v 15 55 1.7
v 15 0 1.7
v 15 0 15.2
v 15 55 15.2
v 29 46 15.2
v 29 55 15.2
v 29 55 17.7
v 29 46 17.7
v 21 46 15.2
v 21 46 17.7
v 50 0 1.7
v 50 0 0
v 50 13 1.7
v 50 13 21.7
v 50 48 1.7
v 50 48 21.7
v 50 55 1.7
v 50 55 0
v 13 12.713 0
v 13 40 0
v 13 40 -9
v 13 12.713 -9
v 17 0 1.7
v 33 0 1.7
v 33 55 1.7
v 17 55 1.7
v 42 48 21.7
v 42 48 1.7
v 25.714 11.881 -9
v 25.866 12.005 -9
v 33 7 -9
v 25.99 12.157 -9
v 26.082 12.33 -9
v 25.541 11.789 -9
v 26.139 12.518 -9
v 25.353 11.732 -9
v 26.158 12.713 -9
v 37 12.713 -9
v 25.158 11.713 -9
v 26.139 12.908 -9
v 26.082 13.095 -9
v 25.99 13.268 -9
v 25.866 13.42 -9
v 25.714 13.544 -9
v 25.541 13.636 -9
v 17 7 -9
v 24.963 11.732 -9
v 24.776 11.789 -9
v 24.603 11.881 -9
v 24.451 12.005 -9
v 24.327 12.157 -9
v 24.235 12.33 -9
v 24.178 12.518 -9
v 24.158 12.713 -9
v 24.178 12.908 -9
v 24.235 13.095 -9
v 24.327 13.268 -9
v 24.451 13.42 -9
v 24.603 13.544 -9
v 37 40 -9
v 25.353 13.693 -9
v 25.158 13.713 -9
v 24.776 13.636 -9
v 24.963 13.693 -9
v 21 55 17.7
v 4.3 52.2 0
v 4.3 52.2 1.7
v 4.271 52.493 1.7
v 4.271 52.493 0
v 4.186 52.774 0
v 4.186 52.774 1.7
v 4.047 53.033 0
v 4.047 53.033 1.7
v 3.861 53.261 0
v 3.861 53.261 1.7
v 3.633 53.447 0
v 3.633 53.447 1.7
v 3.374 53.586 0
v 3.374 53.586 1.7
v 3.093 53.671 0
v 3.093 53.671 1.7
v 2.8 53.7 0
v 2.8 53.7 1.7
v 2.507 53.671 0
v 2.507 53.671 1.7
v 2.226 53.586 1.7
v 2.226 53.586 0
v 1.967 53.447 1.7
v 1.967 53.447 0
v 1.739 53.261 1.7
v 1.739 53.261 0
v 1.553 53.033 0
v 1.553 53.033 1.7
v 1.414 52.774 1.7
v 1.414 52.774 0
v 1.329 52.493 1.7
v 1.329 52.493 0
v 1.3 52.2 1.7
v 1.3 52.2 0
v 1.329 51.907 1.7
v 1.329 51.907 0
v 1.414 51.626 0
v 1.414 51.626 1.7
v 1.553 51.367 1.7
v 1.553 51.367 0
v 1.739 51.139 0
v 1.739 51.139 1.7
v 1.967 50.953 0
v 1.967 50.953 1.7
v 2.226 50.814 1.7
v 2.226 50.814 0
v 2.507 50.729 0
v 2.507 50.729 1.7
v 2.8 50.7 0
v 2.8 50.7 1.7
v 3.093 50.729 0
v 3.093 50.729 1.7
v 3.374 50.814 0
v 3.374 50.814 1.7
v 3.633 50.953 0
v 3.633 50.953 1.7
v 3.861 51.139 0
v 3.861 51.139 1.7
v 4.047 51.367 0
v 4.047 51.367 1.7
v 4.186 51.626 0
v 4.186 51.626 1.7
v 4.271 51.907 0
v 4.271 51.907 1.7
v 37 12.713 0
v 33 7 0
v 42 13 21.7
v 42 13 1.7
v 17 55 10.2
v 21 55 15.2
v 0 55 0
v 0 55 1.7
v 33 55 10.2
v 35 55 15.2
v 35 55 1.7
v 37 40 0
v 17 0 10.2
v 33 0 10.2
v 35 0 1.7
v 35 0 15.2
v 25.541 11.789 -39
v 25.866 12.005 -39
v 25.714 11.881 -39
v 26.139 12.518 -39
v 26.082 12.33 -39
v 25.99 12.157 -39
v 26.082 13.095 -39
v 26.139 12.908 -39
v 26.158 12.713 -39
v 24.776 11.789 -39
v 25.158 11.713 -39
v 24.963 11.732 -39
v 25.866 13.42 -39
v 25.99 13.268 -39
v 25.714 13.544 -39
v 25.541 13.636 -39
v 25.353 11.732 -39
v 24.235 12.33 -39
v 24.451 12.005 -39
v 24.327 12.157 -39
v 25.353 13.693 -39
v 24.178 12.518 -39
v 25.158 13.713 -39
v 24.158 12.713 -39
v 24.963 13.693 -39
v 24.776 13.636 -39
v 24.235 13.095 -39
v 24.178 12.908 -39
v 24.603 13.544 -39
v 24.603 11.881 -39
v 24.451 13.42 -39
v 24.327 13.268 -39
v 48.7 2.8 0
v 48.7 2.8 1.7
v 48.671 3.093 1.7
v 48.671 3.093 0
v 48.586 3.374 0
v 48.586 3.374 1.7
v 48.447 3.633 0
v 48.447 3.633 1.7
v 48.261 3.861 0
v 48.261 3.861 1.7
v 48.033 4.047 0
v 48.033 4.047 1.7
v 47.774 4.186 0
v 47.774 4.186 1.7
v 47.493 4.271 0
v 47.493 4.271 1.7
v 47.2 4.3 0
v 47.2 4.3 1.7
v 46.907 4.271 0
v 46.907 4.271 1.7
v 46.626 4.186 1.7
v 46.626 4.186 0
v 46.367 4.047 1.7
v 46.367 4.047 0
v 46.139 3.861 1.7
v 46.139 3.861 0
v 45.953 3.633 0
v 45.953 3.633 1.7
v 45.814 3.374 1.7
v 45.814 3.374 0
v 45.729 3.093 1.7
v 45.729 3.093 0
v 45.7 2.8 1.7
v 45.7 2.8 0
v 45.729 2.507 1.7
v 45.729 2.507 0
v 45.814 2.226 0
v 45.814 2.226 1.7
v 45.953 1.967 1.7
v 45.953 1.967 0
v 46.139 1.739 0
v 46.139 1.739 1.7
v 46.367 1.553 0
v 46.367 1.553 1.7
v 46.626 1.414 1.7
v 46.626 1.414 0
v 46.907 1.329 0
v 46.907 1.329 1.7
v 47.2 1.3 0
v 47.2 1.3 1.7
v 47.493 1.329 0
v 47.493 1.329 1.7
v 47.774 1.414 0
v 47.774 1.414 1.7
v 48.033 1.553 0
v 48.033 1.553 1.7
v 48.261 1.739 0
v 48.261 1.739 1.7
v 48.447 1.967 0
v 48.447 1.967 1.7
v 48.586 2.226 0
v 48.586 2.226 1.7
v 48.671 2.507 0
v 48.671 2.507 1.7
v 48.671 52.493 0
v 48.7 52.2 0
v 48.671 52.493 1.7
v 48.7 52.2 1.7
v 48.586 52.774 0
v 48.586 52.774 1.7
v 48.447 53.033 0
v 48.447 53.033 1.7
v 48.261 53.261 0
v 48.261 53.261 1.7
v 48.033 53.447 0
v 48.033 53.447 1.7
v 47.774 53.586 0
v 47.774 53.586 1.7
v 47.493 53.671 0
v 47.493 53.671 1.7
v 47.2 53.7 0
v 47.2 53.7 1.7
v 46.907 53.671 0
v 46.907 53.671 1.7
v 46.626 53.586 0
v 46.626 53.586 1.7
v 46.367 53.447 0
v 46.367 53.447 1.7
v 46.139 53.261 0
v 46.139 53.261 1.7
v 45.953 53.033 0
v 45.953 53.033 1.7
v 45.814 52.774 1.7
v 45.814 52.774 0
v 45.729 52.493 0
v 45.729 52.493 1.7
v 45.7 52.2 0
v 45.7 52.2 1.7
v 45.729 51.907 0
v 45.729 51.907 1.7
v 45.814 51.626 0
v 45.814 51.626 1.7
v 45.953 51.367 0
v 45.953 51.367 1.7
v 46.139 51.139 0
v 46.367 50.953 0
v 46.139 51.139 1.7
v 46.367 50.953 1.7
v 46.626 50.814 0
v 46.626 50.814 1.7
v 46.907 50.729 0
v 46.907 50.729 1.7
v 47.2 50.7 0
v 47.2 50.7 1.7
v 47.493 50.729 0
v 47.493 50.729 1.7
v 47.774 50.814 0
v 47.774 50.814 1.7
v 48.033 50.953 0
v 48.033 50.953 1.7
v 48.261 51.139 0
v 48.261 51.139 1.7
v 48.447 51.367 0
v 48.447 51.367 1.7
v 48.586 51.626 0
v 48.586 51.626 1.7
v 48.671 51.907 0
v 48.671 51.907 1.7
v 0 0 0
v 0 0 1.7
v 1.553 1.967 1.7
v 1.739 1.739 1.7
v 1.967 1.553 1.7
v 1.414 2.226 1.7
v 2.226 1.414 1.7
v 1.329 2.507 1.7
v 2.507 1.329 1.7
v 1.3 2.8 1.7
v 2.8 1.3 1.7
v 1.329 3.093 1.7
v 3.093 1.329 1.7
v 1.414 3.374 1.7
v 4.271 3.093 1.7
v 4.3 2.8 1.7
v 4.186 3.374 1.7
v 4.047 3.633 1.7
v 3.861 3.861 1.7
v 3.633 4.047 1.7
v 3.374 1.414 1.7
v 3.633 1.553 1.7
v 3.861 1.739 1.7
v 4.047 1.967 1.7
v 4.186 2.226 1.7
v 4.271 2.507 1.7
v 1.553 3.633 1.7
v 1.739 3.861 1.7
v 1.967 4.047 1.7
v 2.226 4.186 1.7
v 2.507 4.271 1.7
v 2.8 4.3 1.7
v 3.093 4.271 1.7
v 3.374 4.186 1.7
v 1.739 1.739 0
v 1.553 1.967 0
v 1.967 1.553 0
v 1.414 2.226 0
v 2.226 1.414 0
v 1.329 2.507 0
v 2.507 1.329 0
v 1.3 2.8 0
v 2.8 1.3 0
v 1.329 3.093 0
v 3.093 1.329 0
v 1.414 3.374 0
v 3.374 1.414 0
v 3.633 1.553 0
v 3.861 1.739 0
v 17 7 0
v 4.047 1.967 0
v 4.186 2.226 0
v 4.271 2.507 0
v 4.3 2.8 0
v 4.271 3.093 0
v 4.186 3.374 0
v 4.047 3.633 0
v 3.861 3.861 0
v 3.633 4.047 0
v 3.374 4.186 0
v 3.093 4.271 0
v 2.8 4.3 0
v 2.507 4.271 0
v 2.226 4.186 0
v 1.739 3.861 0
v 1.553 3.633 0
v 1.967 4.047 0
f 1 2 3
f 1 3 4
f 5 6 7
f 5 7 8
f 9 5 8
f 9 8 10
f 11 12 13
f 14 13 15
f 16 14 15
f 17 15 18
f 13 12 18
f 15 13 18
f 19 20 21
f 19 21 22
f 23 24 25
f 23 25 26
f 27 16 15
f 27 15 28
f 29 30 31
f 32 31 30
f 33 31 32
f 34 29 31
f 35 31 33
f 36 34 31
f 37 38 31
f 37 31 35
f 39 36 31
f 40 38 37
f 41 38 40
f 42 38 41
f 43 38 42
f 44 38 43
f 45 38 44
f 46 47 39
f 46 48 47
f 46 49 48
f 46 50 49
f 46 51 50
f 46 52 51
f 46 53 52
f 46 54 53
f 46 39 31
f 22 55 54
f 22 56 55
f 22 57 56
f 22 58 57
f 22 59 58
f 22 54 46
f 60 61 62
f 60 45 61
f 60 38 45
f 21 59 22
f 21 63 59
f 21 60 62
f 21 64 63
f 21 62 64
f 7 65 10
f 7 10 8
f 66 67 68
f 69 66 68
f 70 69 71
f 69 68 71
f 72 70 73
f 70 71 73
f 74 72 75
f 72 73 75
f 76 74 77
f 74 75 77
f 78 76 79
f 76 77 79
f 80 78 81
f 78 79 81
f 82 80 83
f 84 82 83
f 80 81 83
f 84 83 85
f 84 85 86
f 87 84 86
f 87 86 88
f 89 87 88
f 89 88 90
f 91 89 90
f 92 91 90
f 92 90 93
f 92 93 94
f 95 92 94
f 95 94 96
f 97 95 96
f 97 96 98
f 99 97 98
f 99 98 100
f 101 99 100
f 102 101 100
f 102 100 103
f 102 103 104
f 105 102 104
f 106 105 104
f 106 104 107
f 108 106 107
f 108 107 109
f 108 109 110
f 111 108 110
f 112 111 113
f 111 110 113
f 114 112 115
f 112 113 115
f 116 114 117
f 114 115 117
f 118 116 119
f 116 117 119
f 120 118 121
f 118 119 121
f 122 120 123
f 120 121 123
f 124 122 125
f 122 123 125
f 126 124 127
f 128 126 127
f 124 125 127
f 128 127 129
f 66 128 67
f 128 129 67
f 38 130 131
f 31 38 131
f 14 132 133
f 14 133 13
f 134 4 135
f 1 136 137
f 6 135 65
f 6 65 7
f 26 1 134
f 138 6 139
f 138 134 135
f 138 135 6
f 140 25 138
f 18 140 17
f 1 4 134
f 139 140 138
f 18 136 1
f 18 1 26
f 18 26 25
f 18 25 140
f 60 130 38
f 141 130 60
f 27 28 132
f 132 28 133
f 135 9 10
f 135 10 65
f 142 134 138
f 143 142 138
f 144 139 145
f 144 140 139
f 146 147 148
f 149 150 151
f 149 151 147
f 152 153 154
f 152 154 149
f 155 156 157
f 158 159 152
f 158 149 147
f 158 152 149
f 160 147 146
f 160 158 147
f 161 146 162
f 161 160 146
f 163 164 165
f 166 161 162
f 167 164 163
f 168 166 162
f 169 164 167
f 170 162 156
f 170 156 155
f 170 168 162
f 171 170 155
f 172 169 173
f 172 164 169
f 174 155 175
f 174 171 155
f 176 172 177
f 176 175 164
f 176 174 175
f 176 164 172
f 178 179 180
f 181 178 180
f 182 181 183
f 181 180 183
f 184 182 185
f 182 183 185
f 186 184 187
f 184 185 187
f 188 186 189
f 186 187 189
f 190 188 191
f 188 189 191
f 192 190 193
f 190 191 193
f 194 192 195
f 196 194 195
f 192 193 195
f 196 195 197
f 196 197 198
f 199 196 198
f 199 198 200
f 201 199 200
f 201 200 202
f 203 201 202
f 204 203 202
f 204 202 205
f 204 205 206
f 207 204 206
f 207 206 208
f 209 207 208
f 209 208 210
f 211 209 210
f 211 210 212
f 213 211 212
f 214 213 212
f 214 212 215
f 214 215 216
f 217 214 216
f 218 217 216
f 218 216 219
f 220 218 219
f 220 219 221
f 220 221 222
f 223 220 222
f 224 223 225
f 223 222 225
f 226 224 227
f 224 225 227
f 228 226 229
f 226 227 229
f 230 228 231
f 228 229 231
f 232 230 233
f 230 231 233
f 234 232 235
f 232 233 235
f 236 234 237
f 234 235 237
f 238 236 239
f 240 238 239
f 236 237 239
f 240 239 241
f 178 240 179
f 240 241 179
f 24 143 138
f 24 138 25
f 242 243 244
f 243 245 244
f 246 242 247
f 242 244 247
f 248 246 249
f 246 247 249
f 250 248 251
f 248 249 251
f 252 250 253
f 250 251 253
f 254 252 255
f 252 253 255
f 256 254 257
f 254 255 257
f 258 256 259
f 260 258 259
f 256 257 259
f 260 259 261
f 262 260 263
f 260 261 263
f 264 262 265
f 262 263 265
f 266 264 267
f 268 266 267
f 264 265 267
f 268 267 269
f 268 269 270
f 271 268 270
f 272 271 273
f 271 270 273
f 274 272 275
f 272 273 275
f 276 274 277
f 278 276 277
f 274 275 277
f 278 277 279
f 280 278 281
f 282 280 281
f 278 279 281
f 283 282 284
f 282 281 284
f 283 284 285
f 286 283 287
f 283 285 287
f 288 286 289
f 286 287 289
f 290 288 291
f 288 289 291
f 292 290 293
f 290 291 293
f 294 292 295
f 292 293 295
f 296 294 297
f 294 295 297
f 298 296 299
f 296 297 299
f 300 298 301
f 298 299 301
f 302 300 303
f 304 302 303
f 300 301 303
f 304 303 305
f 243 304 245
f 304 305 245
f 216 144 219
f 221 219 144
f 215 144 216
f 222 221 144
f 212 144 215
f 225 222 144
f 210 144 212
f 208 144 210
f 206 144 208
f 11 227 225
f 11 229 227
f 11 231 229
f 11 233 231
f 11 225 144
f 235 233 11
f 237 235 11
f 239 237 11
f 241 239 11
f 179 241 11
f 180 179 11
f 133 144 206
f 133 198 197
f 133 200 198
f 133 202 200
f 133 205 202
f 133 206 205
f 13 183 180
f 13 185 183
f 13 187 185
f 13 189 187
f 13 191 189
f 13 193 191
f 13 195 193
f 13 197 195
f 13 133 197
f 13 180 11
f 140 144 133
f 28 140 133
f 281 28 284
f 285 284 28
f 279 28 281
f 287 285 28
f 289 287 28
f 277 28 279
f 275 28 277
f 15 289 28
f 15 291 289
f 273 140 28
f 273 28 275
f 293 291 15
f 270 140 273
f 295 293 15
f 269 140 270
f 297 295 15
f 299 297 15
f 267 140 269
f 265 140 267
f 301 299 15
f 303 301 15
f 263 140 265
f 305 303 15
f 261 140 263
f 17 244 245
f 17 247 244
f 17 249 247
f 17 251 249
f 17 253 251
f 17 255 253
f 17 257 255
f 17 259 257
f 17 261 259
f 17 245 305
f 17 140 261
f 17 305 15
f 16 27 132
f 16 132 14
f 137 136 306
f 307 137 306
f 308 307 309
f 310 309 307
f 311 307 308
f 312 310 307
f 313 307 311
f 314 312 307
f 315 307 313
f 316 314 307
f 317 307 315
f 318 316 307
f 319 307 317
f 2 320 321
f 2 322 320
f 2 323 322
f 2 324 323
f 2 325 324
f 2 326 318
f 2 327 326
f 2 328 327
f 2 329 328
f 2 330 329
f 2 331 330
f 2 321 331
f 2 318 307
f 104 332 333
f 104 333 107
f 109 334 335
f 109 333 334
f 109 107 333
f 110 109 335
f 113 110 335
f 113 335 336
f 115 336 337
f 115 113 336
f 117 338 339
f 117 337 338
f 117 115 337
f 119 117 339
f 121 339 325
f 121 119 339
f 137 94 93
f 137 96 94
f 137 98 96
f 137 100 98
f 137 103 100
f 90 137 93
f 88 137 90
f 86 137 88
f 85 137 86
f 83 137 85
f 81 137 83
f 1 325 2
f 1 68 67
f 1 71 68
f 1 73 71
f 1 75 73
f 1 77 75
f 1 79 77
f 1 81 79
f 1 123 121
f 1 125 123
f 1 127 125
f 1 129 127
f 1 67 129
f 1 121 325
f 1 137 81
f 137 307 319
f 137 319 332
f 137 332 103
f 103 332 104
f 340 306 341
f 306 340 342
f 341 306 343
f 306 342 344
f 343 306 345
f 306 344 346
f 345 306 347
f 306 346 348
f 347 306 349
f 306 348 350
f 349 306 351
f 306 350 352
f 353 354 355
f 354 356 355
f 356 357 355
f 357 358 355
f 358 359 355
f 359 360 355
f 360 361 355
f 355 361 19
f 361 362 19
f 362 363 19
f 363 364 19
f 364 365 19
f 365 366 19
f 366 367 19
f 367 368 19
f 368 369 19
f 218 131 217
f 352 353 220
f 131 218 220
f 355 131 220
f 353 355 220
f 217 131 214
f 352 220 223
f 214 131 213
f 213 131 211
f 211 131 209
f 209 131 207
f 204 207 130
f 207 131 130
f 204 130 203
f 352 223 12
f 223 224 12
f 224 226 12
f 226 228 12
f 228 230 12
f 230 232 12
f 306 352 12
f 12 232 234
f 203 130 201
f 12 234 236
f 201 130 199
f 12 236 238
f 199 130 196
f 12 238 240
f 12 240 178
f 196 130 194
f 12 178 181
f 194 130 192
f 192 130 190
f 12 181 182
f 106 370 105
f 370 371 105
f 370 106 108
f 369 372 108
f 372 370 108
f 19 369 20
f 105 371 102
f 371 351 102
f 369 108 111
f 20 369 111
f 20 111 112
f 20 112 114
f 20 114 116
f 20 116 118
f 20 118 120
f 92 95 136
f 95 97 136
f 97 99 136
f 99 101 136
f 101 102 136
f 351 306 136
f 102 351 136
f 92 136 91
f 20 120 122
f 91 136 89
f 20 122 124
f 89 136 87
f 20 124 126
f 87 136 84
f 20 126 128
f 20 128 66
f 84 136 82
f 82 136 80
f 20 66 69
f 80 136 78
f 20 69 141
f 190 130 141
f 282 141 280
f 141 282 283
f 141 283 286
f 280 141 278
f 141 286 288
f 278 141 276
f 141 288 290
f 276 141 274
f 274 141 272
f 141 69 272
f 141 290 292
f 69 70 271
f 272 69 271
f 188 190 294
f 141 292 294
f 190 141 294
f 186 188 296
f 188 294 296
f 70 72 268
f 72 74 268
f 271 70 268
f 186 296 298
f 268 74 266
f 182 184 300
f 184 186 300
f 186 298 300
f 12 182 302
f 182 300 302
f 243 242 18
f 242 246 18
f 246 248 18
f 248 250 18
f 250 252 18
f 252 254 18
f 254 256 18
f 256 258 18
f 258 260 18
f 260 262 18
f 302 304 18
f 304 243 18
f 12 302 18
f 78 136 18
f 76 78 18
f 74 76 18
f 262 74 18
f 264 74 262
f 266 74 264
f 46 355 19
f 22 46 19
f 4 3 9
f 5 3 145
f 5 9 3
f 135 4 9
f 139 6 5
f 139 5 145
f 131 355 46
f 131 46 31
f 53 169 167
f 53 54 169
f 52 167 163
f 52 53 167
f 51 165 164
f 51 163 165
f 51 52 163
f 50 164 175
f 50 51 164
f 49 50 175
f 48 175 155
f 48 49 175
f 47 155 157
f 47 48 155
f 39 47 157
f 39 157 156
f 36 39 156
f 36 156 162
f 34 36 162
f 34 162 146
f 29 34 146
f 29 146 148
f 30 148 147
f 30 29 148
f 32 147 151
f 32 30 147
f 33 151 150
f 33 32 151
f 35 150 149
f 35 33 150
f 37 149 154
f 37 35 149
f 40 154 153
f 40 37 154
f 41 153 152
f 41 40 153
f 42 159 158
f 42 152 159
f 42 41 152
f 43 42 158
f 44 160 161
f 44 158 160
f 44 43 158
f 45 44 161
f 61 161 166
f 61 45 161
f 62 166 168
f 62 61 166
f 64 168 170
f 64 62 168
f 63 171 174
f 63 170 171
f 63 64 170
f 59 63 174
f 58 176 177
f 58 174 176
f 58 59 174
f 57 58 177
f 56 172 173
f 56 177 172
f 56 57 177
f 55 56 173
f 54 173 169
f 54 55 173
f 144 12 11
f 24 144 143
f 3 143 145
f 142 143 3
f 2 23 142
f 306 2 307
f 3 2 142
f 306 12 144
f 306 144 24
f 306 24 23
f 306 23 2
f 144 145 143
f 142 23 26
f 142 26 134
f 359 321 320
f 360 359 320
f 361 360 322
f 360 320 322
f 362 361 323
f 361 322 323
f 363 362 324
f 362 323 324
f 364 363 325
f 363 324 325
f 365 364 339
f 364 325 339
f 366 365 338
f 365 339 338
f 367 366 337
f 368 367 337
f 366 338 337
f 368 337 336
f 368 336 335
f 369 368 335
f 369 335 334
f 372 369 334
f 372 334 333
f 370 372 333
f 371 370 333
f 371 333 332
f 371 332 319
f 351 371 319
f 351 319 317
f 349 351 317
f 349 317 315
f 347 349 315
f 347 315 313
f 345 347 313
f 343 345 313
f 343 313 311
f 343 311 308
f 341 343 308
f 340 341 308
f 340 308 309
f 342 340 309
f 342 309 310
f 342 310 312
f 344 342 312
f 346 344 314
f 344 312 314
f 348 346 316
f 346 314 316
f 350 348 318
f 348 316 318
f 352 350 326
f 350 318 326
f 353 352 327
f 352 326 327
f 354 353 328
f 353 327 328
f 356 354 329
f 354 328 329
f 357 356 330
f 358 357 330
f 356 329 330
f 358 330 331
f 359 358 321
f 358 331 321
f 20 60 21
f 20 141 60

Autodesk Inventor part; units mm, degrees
ref_plane "YZ Plane" through (0, 0, 0) normal (1, 0, 0) x (0, 1, 0)
ref_plane "XZ Plane" through (0, 0, 0) normal (0, 1, 0) x (-1, 0, 0)
ref_plane "XY Plane" through (0, 0, 0) normal (0, 0, 1) x (1, 0, 0)
sketch "Esquisse1" plane through (0, 0, 0) normal (0, 0, 1) x (1, 0, 0)
  line L0 (0, 0) -> (50, 0)
  line L1 (50, 0) -> (50, 55)
  line L2 (50, 55) -> (0, 55)
  line L3 (0, 55) -> (0, 0)
  dimension "d0" = 50
  dimension "d1" = 55
extrude "Extrusion1" add sketch "Esquisse1" along normal blind 1.7
sketch "Esquisse2" plane through (0, 0, 1.7) normal (0, 0, 1) x (1, 0, 0)
  line L0 (0, 0) -> (50, 0) construction
  line L1 (50, 0) -> (50, 55) construction
  line L2 (50, 55) -> (0, 55) construction
  line L3 (0, 55) -> (0, 0) construction
  line L4 (25, 55) -> (25, 0) construction
  line L5 (0, 27.5) -> (50, 27.5) construction
  circle A0 centre (2.8, 52.2) radius 1.5
  line L6 (2.8, 52.2) -> (2.8, 55) construction
  line L7 (2.8, 52.2) -> (0, 52.2) construction
  circle A1 centre (47.2, 52.2) radius 1.5
  circle A2 centre (2.8, 2.8) radius 1.5
  circle A3 centre (47.2, 2.8) radius 1.5
  dimension "d4" = 2.8
  dimension "d5" = 3
extrude "Extrusion2" cut sketch "Esquisse2" against normal blind 1.7
sketch "Esquisse3" plane through (0, 0, 1.7) normal (0, 0, 1) x (1, 0, 0)
  line L0 (50, 0) -> (50, 55) construction
  line L1 (0, 55) -> (0, 0) construction
  line L2 (15, 55) -> (35, 55)
  line L3 (35, 55) -> (35, 0)
  line L4 (35, 0) -> (15, 0)
  line L5 (15, 0) -> (15, 55)
  line L6 (15, 27.5) -> (0, 27.5) construction
  line L7 (35, 27.5) -> (50, 27.5) construction
  dimension "d8" = 20
  dimension "d9" = 55
extrude "Extrusion3" add sketch "Esquisse3" along normal blind 8.5
sketch "Esquisse4" plane through (0, 0, 0) normal (0, -1, 0) x (1, 0, 0)
  line L0 (0, 0) -> (50, 0) projected
  line L1 (35, 1.7) -> (50, 1.7) projected
  line L2 (35, 1.7) -> (35, 10.2) projected
  line L3 (15, 10.2) -> (35, 10.2) projected
  line L4 (15, 1.7) -> (15, 10.2) projected
  line L5 (17, 10.2) -> (33, 10.2)
  line L6 (33, 10.2) -> (33, 1.7)
  line L7 (33, 1.7) -> (17, 1.7)
  line L8 (17, 1.7) -> (17, 10.2)
  line L9 (25, 1.7) -> (25, 0) construction
  line L10 (39.3041, 1.7) -> (39.3041, 0) construction
  dimension "d12" = 2
  dimension "d13" = 2
extrude "Extrusion4" cut sketch "Esquisse4" against normal through all
sketch "Esquisse5" plane through (0, 0, 10.2) normal (0, 0, 1) x (1, 0, 0)
  line L0 (33, 55) -> (33, 0) construction
  line L1 (35, 55) -> (33, 55) construction
  line L2 (35, 0) -> (35, 55) construction
  line L3 (33, 0) -> (35, 0) construction
  line L4 (15, 55) -> (35, 55)
  line L5 (35, 55) -> (35, 0)
  line L6 (35, 0) -> (15, 0)
  line L7 (15, 0) -> (15, 55)
  point P0 (0, 0)
extrude "Extrusion5" add sketch "Esquisse5" along normal blind 5
sketch "Esquisse6" plane through (0, 0, 15.2) normal (0, 0, 1) x (1, 0, 0)
  line L0 (35, 55) -> (15, 55) construction
  line L1 (15, 55) -> (15, 0) construction
  line L2 (35, 0) -> (35, 55) construction
  line L3 (21, 55) -> (29, 55)
  line L4 (29, 55) -> (29, 46)
  line L5 (29, 46) -> (21, 46)
  line L6 (21, 46) -> (21, 55)
  line L7 (21, 50.5) -> (15, 50.5) construction
  line L8 (29, 50.5) -> (35, 50.5) construction
  point P0 (0, 0)
  dimension "d18" = 8
  dimension "d19" = 9
extrude "Extrusion6" add sketch "Esquisse6" along normal blind 2.5
sketch "Esquisse7" plane through (0, 0, 0) normal (0, 0, -1) x (-1, 0, 0)
  line L0 (0, 0) -> (-50, 0) construction
  line L1 (0, 55) -> (0, 0) construction
  line L2 (-50, 0) -> (-50, 55) construction
  line L3 (-37, 40) -> (-13, 40)
  line L4 (-13, 40) -> (-13, 12.7126)
  line L5 (-17, 7) -> (-33, 7)
  line L6 (-37, 12.7126) -> (-37, 40)
  line L7 (-37, 23.5) -> (-50, 23.5) construction
  line L8 (-13, 23.5) -> (0, 23.5) construction
  line L9 (-37, 12.7126) -> (-33, 7)
  line L10 (-17, 7) -> (-13, 12.7126)
  dimension "d23" = 7
  dimension "d24" = 24
  dimension "d28" = 145
  dimension "d29" = 145
  dimension "d30" = 33
  dimension "d31" = 4
extrude "Extrusion7" add sketch "Esquisse7" along normal blind 9
sketch "Esquisse8" plane through (0, 0, -9) normal (0, 0, -1) x (-1, 0, 0)
  line L0 (-17, 7) -> (-13, 12.7126) construction
  line L1 (-13, 12.7126) -> (-13, 40) construction
  circle A0 centre (-25.1584, 12.7126) radius 1
  line L2 (-13, 12.7126) -> (-37, 12.7126) construction
  line L3 (-33, 7) -> (-25.1584, 12.7126) construction
  line L4 (-25.1584, 12.7126) -> (-17, 7) construction
  point P0 (0, 0)
  dimension "d32" = 2
extrude "Extrusion8" add sketch "Esquisse8" along normal blind 30
sketch "Esquisse9" plane through (0, 0, 1.7) normal (0, 0, 1) x (1, 0, 0)
  line L0 (50, 0) -> (50, 55) construction
  line L1 (50, 55) -> (35, 55) construction
  line L2 (50, 48) -> (42, 48)
  line L3 (42, 48) -> (42, 13)
  line L4 (42, 13) -> (50, 13)
  line L5 (50, 13) -> (50, 48)
  line L6 (42, 48) -> (42, 55) construction
  point P0 (0, 0)
  dimension "d35" = 0
  dimension "d36" = 8
  dimension "d37" = 35
  dimension "d38" = 7
extrude "Extrusion9" add sketch "Esquisse9" along normal blind 20
equation "\"d13\" = d12"
equation "\"d29\" = d28"
properties part number "CarteElectronique"
